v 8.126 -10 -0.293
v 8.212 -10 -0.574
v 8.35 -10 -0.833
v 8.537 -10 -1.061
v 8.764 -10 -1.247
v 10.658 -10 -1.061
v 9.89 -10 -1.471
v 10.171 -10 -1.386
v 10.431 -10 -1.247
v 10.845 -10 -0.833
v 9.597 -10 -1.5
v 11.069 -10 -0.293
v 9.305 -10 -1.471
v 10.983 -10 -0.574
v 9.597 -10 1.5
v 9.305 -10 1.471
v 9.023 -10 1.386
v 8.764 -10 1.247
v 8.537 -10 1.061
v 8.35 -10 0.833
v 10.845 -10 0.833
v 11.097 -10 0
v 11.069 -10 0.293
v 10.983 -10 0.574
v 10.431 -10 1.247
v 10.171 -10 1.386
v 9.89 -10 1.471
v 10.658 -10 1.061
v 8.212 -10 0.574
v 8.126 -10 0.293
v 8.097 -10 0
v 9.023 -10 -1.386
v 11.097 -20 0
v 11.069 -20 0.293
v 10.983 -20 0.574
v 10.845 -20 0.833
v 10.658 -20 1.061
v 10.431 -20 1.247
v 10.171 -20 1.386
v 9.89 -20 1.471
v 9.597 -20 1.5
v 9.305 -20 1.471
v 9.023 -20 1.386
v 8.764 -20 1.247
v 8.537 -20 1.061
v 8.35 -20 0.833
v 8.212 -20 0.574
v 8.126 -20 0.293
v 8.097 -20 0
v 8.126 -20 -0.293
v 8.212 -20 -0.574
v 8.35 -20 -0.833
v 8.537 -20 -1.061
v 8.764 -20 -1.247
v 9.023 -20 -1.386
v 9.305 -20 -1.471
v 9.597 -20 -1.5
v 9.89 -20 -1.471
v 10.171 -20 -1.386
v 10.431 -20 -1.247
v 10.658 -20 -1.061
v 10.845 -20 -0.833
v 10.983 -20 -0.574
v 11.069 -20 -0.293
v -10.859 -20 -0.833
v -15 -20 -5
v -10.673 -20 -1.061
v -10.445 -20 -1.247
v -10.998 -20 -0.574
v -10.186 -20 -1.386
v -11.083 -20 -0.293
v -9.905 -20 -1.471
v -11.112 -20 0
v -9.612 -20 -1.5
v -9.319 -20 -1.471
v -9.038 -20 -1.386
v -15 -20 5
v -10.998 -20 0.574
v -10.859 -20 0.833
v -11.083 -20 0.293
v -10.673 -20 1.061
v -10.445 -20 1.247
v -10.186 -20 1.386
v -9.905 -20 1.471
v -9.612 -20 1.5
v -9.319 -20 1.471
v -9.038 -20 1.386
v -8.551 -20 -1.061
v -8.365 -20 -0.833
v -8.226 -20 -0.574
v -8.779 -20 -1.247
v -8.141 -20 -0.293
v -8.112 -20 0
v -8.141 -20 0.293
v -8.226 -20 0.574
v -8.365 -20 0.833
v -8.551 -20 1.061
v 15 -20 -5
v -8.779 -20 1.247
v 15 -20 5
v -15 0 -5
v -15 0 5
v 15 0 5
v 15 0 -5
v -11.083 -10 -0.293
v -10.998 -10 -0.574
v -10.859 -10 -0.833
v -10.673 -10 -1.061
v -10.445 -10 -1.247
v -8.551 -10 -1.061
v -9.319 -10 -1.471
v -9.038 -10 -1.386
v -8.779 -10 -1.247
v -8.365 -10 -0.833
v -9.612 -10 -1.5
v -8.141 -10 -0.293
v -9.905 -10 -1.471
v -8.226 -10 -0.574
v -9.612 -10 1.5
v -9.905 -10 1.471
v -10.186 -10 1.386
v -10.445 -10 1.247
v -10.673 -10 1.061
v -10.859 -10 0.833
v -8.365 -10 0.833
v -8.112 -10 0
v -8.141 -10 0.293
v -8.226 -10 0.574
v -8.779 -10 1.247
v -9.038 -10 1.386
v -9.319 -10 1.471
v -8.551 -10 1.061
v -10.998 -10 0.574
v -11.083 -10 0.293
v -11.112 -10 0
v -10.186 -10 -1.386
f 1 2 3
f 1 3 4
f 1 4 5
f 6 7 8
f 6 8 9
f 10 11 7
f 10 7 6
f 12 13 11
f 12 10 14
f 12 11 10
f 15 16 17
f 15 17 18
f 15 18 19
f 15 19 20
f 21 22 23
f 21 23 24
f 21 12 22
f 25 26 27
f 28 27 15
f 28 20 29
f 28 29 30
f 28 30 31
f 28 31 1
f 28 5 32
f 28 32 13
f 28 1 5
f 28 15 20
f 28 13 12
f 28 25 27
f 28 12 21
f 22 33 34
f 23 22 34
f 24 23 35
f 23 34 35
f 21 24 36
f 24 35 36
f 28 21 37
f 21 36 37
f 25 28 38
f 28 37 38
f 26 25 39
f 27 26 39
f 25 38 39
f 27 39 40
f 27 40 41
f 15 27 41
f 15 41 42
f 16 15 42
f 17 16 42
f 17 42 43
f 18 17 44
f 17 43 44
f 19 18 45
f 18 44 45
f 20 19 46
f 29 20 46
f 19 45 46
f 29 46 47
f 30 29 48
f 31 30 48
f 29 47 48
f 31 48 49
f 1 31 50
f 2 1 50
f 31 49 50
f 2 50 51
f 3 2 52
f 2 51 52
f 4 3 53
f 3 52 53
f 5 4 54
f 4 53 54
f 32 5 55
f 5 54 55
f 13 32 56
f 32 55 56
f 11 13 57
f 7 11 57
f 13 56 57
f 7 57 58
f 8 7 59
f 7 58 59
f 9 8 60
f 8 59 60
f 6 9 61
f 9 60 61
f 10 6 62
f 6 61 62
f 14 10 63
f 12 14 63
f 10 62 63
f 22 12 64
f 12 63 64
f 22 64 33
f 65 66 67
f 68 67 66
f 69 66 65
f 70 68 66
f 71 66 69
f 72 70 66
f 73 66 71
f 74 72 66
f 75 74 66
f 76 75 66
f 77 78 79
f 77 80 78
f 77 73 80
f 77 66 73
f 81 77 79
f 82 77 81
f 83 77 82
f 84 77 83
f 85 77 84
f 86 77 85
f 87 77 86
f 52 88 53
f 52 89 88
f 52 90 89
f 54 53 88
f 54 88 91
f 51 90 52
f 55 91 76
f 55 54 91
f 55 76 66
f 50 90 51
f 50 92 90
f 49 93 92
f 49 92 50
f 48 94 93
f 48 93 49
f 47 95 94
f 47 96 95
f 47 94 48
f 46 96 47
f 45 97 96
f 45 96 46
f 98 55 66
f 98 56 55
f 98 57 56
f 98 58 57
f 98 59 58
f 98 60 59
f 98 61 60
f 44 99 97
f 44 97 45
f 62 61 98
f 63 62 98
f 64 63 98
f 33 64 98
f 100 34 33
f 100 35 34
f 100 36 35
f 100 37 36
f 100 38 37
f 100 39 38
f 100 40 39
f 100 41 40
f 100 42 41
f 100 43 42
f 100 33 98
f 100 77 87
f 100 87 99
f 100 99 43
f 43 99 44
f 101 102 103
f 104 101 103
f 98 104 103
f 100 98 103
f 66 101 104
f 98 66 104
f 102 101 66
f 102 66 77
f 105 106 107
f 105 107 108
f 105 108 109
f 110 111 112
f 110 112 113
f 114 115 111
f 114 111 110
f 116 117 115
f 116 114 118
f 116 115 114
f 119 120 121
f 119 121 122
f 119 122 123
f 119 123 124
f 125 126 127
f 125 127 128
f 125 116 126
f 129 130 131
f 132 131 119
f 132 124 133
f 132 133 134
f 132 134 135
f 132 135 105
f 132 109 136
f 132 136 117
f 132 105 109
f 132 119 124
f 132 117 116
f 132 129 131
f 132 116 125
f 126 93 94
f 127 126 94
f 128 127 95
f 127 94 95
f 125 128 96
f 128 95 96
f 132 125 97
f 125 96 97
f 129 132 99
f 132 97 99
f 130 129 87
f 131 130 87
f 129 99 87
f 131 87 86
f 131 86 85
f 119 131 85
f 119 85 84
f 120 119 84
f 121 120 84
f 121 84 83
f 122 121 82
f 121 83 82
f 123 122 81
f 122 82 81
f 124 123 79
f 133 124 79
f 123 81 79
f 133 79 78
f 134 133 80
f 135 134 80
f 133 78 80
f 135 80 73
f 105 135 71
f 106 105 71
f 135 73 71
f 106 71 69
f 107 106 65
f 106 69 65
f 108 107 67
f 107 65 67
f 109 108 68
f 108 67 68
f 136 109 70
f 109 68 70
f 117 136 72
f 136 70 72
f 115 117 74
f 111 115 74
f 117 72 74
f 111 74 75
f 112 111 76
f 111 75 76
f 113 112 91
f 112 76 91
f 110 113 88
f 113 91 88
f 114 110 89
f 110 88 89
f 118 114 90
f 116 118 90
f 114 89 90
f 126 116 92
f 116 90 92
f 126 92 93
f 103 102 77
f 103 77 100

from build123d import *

# Parameters (mm, degrees)
F0_W     = 30
F0_H     = 10
F1_DEPTH = 20
F3_R     = 1.5
F4_DEPTH = 10
F5_DEPTH = 10


with BuildPart() as f1:
    # F0 (on Front) → F1 (new body)
    with BuildSketch(Plane.XZ):
        Rectangle(F0_W, F0_H)
    extrude(amount=F1_DEPTH)

    # F3 (on face) → F4 (cut)
    with BuildSketch(Plane.XZ.offset(20)):
        with Locations((9.597428, 0)):
            Circle(F3_R)
    extrude(amount=-F4_DEPTH, mode=Mode.SUBTRACT)

    # F3 (on face) → F5 (cut)
    with BuildSketch(Plane.XZ.offset(20)):
        with Locations((-9.612025, 0)):
            Circle(F3_R)
    extrude(amount=-F5_DEPTH, mode=Mode.SUBTRACT)


solid = f1.part
